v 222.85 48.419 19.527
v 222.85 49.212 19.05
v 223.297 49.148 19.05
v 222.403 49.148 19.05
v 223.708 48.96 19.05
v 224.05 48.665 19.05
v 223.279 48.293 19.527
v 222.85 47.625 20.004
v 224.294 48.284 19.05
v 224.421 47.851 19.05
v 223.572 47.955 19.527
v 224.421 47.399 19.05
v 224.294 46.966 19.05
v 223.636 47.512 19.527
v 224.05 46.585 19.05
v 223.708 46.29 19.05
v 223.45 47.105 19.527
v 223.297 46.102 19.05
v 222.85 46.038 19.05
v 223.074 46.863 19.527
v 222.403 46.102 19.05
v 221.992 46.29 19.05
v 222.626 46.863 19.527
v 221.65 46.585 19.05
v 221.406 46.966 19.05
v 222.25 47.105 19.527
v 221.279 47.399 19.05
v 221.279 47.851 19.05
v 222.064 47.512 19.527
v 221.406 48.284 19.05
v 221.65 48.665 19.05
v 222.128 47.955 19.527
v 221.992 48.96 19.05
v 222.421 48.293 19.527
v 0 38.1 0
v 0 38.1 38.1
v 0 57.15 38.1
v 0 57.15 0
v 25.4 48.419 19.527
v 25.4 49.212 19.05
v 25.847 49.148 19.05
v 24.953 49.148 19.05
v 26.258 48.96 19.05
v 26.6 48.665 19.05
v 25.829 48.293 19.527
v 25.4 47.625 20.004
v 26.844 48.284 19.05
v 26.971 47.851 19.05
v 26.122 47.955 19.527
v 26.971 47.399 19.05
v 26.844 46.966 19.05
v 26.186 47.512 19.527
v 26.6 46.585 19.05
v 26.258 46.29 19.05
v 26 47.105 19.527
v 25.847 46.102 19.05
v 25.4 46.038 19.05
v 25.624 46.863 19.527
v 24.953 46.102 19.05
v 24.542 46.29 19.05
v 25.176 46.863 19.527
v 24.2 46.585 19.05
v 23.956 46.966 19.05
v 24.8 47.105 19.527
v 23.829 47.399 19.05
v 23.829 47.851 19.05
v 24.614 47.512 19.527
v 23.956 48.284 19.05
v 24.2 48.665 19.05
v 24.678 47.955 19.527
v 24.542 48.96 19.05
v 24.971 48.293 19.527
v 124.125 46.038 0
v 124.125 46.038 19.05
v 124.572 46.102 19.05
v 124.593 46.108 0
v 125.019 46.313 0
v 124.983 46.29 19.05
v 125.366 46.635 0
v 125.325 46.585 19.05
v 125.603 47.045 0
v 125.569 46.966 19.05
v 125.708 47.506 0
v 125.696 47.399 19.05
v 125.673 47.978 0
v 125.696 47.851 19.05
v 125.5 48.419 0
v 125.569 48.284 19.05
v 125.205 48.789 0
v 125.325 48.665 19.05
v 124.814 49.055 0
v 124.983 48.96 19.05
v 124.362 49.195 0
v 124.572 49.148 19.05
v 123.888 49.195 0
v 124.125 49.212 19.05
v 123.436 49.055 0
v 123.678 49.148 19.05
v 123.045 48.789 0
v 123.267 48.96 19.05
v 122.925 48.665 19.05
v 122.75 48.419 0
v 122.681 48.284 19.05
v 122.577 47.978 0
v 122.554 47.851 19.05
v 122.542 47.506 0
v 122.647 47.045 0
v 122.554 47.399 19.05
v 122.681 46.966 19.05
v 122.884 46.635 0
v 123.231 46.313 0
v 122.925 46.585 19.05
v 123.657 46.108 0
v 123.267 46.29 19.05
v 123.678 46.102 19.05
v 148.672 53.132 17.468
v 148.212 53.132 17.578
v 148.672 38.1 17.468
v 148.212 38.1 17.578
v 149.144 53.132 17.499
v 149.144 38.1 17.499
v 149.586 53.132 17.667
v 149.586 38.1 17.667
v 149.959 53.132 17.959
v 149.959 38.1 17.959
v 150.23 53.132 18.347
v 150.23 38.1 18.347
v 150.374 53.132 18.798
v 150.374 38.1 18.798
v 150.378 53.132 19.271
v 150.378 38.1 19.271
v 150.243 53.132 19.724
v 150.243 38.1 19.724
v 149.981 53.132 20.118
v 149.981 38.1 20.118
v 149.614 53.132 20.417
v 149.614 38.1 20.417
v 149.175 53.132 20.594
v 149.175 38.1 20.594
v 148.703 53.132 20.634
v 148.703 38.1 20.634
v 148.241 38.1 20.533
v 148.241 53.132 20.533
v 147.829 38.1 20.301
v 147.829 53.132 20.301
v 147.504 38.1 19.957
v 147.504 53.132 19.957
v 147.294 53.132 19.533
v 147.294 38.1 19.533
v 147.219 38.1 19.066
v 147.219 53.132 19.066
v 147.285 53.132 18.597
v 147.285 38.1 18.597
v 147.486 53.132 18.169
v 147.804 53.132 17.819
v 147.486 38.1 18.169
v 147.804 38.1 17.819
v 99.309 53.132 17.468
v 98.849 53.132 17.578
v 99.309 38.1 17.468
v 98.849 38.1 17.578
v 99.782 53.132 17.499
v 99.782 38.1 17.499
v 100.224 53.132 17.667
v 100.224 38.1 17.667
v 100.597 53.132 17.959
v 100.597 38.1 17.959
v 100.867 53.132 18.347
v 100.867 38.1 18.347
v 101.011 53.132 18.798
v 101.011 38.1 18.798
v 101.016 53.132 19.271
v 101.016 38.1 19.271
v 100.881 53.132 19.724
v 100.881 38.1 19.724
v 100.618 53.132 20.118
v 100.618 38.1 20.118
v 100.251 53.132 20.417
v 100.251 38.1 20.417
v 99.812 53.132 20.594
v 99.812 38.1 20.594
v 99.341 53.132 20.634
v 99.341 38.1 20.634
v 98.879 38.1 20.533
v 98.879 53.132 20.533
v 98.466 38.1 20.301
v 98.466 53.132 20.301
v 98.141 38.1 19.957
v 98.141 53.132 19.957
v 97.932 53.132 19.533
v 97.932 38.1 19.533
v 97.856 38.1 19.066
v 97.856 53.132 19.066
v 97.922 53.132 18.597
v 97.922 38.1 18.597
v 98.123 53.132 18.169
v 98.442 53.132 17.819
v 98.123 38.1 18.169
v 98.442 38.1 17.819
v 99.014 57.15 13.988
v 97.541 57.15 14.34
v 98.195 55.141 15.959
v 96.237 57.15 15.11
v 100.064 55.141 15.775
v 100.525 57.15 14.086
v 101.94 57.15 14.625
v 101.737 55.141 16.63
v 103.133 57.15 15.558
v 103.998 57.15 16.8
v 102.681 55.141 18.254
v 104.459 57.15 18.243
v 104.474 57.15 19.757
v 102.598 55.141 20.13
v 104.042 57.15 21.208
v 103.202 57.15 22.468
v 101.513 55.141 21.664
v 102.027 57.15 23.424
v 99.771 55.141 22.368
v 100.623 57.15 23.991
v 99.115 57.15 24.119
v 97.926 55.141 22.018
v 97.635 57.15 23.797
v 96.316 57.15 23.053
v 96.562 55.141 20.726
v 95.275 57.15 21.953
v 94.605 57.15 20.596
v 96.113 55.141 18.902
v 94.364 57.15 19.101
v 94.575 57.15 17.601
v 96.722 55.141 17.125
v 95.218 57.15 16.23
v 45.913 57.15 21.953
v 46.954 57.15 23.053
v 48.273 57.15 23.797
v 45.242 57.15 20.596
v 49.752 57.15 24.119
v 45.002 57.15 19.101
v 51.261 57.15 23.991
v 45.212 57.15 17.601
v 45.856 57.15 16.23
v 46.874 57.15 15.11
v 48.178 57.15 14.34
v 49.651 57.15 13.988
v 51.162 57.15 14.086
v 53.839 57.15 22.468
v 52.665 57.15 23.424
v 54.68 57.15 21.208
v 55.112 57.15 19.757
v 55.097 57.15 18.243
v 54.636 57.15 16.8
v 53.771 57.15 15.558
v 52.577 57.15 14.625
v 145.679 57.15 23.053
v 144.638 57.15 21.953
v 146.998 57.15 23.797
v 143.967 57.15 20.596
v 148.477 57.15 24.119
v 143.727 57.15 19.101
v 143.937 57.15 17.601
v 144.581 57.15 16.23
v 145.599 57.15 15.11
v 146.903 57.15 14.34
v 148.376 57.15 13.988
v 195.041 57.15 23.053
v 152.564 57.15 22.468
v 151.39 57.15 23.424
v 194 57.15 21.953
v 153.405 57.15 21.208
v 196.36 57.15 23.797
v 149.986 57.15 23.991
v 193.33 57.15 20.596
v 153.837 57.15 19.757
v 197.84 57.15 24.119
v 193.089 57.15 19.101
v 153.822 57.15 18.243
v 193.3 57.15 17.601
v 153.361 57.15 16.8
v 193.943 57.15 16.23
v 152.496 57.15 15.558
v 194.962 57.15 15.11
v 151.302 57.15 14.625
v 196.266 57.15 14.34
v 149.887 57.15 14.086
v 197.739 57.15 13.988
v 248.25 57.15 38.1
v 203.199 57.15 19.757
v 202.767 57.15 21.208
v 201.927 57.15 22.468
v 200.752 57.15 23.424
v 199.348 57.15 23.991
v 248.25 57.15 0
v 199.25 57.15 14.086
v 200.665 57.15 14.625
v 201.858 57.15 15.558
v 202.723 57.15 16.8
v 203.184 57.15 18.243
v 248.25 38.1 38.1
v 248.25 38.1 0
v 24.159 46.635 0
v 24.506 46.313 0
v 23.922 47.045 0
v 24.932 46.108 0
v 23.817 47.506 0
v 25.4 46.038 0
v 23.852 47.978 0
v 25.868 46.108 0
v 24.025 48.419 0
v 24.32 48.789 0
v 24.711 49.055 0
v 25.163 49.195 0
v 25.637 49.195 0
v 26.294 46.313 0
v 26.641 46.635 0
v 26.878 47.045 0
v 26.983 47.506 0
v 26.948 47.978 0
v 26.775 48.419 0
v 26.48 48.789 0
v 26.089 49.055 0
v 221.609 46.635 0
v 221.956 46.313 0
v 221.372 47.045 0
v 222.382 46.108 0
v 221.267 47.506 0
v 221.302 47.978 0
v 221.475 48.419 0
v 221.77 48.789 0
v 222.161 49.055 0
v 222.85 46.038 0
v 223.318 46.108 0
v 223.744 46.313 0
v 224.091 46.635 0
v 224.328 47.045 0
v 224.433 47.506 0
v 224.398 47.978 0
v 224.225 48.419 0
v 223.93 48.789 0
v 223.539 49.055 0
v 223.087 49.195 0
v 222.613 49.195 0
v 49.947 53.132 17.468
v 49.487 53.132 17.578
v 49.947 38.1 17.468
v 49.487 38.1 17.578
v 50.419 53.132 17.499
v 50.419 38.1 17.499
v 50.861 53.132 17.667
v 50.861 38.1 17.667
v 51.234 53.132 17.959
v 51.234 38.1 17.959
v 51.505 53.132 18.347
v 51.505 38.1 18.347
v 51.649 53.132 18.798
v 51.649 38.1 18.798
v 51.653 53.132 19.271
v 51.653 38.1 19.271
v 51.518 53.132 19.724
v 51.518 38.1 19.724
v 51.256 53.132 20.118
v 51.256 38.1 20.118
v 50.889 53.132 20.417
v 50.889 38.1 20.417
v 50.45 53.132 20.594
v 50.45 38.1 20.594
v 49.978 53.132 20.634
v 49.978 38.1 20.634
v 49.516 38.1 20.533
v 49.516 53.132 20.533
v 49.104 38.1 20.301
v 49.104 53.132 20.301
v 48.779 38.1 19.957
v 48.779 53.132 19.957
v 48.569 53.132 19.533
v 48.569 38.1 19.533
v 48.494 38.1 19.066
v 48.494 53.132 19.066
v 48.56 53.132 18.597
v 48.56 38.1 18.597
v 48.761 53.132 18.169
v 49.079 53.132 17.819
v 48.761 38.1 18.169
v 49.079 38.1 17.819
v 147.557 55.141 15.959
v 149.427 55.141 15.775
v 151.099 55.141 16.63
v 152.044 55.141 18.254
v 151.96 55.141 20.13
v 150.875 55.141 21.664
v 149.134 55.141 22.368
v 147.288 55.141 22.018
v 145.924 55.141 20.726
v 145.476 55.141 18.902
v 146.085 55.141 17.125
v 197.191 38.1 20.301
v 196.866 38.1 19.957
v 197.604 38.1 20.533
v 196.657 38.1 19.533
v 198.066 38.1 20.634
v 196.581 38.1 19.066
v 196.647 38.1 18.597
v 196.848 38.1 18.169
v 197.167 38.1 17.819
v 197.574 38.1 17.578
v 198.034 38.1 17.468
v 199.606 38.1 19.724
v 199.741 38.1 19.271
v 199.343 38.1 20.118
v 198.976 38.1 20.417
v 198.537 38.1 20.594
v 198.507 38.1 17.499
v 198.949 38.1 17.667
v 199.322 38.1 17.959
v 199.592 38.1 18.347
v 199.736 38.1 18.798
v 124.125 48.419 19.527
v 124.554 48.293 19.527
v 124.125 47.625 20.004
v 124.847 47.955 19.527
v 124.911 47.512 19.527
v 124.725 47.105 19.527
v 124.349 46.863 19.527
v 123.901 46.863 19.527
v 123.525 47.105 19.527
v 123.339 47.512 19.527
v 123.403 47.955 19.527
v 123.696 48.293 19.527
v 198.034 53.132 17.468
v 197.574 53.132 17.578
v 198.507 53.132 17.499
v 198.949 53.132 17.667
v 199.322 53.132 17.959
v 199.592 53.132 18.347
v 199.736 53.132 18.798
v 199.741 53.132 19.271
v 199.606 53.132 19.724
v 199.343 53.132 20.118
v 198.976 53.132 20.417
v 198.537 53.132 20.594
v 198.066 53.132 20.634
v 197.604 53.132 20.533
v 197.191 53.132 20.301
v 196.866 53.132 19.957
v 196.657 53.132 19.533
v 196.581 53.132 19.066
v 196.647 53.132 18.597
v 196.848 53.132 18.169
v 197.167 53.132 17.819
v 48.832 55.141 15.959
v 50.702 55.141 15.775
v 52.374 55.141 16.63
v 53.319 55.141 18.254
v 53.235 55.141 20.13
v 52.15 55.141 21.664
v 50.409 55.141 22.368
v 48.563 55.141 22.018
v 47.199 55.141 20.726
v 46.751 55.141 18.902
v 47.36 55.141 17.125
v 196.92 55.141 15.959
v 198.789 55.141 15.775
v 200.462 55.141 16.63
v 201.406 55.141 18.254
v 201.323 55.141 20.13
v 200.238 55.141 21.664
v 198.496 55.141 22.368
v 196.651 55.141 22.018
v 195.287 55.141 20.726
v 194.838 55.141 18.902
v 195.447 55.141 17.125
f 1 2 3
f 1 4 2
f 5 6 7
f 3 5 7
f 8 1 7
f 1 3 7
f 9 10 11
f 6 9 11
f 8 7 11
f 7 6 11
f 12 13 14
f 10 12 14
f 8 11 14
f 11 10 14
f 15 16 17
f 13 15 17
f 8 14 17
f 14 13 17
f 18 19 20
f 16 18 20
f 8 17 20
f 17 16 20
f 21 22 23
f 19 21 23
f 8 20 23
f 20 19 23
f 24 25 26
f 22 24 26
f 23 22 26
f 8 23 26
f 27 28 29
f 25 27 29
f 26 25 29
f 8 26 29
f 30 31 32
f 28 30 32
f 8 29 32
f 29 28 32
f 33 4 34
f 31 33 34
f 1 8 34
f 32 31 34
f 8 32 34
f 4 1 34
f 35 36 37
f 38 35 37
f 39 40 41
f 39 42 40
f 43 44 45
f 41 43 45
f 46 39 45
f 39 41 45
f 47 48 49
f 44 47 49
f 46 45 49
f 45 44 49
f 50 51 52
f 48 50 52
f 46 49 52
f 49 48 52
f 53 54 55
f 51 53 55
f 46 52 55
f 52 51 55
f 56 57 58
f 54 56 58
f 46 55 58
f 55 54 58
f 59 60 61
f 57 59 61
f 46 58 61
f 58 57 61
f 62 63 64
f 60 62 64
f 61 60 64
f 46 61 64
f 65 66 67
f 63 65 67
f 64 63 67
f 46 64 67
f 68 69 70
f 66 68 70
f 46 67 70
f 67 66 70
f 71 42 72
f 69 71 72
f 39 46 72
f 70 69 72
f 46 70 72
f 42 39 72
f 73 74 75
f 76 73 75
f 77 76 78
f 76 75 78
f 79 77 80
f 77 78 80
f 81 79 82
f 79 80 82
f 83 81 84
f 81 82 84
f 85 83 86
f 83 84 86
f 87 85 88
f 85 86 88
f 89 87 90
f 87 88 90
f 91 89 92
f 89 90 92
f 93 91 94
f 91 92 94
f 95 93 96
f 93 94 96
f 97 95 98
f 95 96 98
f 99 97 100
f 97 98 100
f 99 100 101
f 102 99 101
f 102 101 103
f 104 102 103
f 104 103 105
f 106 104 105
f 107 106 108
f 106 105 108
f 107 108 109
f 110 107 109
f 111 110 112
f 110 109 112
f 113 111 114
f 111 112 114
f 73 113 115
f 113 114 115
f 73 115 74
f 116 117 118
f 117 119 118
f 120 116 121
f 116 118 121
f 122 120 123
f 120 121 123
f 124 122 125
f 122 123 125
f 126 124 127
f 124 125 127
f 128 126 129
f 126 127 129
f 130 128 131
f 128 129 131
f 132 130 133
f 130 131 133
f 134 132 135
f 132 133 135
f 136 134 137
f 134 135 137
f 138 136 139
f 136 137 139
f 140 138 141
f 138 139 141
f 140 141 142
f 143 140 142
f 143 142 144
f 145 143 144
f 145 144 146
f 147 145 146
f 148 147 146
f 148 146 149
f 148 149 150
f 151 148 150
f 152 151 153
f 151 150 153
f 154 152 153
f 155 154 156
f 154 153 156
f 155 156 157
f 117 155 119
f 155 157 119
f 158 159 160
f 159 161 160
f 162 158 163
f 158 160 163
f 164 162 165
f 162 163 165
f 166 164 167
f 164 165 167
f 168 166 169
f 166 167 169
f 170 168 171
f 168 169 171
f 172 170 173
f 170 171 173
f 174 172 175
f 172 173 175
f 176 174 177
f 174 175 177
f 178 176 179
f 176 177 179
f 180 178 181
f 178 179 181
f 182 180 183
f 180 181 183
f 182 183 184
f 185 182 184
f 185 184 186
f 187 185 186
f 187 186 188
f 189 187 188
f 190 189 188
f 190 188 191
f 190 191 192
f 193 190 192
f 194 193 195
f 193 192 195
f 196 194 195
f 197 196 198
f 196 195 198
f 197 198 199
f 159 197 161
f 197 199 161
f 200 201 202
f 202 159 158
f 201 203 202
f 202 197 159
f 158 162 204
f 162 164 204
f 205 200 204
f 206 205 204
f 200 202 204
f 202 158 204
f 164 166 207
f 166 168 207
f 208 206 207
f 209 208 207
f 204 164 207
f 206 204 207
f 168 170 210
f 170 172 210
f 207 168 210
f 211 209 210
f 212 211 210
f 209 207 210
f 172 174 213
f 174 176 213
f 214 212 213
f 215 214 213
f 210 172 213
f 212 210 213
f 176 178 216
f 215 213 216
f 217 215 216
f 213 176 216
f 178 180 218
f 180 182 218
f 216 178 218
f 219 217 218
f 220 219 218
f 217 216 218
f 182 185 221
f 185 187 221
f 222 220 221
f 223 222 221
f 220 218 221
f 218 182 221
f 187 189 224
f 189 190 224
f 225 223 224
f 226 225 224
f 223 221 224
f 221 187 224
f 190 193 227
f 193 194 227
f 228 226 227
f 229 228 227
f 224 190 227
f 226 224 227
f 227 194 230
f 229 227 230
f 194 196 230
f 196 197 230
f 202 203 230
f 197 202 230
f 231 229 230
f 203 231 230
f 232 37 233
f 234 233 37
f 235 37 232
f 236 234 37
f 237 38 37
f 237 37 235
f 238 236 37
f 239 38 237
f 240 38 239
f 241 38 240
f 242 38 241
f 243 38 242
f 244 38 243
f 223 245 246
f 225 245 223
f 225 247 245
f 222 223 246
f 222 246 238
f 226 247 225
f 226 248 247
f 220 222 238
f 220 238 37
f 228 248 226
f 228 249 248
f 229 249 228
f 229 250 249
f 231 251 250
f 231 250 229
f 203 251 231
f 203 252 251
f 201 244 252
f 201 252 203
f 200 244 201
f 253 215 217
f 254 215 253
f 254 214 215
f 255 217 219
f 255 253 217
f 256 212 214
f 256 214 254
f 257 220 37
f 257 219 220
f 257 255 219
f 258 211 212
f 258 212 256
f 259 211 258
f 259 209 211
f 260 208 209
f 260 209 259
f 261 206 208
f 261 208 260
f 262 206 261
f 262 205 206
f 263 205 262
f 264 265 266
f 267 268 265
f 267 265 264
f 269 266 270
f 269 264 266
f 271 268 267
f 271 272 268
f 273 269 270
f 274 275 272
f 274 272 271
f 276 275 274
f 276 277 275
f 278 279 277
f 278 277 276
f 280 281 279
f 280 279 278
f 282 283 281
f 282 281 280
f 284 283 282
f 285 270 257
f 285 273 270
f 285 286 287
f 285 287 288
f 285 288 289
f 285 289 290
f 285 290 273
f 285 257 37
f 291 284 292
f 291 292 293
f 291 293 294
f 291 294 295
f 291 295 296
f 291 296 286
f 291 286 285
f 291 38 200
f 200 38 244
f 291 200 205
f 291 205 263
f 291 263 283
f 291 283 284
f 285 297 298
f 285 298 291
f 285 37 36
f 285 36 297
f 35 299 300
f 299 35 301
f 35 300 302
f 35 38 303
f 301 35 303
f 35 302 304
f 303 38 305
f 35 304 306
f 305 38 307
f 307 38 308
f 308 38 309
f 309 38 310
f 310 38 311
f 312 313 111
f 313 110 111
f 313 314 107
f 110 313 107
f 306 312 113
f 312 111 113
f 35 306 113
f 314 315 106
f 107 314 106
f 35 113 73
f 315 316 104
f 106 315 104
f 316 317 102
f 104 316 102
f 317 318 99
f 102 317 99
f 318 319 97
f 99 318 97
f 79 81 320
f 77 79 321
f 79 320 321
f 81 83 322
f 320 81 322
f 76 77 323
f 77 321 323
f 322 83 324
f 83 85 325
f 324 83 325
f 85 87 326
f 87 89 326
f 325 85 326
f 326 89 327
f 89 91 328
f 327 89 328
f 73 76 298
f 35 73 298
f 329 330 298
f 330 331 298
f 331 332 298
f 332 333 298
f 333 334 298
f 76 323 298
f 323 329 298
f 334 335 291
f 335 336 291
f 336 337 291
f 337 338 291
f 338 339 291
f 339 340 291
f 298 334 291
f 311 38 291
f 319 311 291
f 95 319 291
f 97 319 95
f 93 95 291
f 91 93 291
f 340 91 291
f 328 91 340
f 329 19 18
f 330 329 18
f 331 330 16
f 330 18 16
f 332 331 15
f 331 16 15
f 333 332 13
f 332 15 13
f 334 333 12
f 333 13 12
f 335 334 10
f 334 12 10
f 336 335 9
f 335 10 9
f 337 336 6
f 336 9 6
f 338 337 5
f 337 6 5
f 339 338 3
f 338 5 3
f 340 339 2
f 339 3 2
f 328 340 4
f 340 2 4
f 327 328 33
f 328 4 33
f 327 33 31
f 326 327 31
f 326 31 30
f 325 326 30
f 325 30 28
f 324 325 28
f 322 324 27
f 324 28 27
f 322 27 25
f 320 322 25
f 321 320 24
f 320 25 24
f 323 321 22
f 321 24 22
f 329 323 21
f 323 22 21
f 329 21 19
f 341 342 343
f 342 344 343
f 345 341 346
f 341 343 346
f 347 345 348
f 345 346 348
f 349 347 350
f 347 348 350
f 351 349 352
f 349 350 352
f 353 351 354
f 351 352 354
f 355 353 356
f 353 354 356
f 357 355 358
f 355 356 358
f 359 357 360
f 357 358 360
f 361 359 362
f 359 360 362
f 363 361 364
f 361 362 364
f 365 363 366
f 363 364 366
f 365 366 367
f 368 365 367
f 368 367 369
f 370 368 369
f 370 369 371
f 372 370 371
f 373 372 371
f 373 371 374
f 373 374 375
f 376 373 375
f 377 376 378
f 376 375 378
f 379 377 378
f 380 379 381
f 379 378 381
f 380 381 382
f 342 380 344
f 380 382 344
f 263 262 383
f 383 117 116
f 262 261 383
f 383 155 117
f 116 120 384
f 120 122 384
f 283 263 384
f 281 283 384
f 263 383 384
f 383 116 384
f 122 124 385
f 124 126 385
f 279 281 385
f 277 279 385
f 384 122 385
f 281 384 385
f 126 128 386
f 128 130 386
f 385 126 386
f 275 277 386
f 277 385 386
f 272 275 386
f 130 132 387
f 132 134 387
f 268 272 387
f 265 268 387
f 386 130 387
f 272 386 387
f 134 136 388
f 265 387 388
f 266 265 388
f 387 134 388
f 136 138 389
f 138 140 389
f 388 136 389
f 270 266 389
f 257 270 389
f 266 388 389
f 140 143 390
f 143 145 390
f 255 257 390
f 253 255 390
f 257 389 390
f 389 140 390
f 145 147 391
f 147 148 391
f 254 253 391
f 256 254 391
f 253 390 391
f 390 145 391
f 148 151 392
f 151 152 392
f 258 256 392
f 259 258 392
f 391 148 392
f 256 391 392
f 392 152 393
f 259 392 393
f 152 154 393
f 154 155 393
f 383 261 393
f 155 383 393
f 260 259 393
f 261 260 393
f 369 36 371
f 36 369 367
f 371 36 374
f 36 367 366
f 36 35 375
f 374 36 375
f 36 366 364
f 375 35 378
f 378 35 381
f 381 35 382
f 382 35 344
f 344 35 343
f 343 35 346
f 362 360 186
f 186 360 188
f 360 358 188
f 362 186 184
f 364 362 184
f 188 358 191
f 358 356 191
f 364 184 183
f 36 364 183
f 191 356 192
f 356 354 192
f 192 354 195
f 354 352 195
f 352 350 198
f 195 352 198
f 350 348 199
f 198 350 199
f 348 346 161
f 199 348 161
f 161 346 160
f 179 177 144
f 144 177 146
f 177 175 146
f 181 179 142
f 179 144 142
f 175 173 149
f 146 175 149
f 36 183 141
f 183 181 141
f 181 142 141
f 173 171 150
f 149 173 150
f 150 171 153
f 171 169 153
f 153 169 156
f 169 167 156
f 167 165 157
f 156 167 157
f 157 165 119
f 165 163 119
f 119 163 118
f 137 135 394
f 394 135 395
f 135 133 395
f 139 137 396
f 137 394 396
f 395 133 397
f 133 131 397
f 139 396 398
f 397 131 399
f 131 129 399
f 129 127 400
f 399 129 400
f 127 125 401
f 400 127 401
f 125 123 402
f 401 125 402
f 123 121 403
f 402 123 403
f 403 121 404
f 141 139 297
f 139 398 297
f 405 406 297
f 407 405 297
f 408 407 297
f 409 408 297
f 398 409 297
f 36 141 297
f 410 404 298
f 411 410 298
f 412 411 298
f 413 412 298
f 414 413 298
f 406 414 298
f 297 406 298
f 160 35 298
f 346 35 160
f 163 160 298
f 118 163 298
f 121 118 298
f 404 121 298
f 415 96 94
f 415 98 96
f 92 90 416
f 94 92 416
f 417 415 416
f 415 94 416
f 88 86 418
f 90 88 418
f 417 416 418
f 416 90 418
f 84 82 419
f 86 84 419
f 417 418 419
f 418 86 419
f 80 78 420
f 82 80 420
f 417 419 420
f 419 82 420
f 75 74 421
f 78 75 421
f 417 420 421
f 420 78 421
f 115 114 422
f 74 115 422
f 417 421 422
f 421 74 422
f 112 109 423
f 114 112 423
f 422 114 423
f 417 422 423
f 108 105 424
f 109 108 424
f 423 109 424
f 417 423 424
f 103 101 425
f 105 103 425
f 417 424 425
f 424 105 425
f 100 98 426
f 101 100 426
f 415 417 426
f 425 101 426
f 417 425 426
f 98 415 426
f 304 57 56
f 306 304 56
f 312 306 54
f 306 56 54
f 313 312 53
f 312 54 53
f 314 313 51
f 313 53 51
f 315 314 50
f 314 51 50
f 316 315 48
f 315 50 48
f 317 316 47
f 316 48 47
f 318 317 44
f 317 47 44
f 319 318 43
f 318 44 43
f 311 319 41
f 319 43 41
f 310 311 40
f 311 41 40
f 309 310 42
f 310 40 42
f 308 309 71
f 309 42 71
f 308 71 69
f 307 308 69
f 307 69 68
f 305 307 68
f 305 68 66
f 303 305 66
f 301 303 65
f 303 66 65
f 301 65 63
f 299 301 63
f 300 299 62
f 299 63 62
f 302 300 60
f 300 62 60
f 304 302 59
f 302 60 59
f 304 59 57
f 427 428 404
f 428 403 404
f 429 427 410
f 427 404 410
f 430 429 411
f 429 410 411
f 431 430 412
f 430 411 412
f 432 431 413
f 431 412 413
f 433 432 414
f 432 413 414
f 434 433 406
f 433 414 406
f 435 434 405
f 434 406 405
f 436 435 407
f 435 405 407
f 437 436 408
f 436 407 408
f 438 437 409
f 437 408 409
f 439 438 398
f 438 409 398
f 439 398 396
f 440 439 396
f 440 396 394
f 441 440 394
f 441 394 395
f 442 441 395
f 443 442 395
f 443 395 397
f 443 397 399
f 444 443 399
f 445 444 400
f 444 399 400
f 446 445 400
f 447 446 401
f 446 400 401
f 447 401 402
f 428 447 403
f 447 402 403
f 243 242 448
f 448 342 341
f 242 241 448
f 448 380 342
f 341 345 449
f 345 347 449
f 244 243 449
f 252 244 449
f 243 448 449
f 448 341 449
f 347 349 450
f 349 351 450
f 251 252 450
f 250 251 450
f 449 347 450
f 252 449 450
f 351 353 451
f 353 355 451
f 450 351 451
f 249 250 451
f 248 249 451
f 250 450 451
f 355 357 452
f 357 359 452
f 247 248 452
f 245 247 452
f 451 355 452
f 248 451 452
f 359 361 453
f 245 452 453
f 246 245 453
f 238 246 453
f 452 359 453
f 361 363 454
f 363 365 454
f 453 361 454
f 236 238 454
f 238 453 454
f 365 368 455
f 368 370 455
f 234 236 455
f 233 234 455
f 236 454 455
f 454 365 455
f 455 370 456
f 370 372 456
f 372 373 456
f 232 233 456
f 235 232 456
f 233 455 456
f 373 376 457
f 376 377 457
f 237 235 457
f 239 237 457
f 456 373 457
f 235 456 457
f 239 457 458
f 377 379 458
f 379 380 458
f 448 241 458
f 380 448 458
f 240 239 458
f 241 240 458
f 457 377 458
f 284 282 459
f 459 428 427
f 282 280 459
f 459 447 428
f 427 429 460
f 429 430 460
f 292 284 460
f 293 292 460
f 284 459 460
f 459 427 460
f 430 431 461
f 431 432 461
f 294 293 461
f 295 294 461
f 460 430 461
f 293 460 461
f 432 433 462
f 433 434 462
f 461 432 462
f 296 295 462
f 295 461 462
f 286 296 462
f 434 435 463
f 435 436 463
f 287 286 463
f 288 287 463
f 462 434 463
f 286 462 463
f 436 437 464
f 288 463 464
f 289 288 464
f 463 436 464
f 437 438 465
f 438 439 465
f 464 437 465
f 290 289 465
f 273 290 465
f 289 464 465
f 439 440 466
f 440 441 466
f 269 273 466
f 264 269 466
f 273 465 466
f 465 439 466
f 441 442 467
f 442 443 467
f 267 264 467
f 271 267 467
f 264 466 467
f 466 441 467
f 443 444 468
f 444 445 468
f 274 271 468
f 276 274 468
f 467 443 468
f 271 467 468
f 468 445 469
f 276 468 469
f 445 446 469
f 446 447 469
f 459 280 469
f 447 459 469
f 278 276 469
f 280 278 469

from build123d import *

# Parameters (mm, degrees)
SKETCH1_W           = 248.25
SKETCH1_H           = 19.05
BOSS_EXTRUDE1_DEPTH = 38.1
HOLE1_D             = 3.175
HOLE1_DEPTH         = 31.75
HOLE1_CSINK_D       = 10.16
HOLE1_CSINK_ANGLE   = 82
HOLE1_TIP           = 0.953866233
HOLE2_D             = 3.175
HOLE2_DEPTH         = 57.15
HOLE2_CSINK_D       = 10.16
HOLE2_CSINK_ANGLE   = 82
HOLE2_TIP           = 0.953866233


with BuildPart() as part:
    # Sketch1 → Boss-Extrude1 (new body)
    with BuildSketch(Plane.XY):
        with Locations((124.125, 47.625)):
            Rectangle(SKETCH1_W, SKETCH1_H)
    extrude(amount=BOSS_EXTRUDE1_DEPTH)

    # Hole1
    with Locations(Plane(origin=(-1090.512770337, -52.974999997, -12.7), x_dir=(0, 1, 0), z_dir=(0, 0, -1))):
        with Locations((-100.332047386, 1313.362770337), (100.599999997, 1313.362770337), (100.599999997, 1115.912770337), (100.599999997, 1214.637770337), (-100.332047386, 1214.637770337), (-100.332047386, 1115.912770337)):
            CounterSinkHole(HOLE1_D / 2, HOLE1_CSINK_D / 2, depth=HOLE1_DEPTH, counter_sink_angle=HOLE1_CSINK_ANGLE)
            with Locations((0, 0, -(HOLE1_DEPTH + HOLE1_TIP / 2))):  # 118° drill point
                Cone(0, HOLE1_D / 2, HOLE1_TIP, mode=Mode.SUBTRACT)

    # Hole2
    with Locations(Plane(origin=(-1090.512770337, 57.15, -415.792401694), x_dir=(0.374606593, 0, 0.927183855), z_dir=(0, 1, 0))):
        with Locations((848.944412528, 940.413642522), (885.927448463, 1031.949868564), (867.435930496, 986.181755543), (830.452894561, 894.645529501)):
            CounterSinkHole(HOLE2_D / 2, HOLE2_CSINK_D / 2, depth=HOLE2_DEPTH, counter_sink_angle=HOLE2_CSINK_ANGLE)
            with Locations((0, 0, -(HOLE2_DEPTH + HOLE2_TIP / 2))):  # 118° drill point
                Cone(0, HOLE2_D / 2, HOLE2_TIP, mode=Mode.SUBTRACT)


solid = part.part
